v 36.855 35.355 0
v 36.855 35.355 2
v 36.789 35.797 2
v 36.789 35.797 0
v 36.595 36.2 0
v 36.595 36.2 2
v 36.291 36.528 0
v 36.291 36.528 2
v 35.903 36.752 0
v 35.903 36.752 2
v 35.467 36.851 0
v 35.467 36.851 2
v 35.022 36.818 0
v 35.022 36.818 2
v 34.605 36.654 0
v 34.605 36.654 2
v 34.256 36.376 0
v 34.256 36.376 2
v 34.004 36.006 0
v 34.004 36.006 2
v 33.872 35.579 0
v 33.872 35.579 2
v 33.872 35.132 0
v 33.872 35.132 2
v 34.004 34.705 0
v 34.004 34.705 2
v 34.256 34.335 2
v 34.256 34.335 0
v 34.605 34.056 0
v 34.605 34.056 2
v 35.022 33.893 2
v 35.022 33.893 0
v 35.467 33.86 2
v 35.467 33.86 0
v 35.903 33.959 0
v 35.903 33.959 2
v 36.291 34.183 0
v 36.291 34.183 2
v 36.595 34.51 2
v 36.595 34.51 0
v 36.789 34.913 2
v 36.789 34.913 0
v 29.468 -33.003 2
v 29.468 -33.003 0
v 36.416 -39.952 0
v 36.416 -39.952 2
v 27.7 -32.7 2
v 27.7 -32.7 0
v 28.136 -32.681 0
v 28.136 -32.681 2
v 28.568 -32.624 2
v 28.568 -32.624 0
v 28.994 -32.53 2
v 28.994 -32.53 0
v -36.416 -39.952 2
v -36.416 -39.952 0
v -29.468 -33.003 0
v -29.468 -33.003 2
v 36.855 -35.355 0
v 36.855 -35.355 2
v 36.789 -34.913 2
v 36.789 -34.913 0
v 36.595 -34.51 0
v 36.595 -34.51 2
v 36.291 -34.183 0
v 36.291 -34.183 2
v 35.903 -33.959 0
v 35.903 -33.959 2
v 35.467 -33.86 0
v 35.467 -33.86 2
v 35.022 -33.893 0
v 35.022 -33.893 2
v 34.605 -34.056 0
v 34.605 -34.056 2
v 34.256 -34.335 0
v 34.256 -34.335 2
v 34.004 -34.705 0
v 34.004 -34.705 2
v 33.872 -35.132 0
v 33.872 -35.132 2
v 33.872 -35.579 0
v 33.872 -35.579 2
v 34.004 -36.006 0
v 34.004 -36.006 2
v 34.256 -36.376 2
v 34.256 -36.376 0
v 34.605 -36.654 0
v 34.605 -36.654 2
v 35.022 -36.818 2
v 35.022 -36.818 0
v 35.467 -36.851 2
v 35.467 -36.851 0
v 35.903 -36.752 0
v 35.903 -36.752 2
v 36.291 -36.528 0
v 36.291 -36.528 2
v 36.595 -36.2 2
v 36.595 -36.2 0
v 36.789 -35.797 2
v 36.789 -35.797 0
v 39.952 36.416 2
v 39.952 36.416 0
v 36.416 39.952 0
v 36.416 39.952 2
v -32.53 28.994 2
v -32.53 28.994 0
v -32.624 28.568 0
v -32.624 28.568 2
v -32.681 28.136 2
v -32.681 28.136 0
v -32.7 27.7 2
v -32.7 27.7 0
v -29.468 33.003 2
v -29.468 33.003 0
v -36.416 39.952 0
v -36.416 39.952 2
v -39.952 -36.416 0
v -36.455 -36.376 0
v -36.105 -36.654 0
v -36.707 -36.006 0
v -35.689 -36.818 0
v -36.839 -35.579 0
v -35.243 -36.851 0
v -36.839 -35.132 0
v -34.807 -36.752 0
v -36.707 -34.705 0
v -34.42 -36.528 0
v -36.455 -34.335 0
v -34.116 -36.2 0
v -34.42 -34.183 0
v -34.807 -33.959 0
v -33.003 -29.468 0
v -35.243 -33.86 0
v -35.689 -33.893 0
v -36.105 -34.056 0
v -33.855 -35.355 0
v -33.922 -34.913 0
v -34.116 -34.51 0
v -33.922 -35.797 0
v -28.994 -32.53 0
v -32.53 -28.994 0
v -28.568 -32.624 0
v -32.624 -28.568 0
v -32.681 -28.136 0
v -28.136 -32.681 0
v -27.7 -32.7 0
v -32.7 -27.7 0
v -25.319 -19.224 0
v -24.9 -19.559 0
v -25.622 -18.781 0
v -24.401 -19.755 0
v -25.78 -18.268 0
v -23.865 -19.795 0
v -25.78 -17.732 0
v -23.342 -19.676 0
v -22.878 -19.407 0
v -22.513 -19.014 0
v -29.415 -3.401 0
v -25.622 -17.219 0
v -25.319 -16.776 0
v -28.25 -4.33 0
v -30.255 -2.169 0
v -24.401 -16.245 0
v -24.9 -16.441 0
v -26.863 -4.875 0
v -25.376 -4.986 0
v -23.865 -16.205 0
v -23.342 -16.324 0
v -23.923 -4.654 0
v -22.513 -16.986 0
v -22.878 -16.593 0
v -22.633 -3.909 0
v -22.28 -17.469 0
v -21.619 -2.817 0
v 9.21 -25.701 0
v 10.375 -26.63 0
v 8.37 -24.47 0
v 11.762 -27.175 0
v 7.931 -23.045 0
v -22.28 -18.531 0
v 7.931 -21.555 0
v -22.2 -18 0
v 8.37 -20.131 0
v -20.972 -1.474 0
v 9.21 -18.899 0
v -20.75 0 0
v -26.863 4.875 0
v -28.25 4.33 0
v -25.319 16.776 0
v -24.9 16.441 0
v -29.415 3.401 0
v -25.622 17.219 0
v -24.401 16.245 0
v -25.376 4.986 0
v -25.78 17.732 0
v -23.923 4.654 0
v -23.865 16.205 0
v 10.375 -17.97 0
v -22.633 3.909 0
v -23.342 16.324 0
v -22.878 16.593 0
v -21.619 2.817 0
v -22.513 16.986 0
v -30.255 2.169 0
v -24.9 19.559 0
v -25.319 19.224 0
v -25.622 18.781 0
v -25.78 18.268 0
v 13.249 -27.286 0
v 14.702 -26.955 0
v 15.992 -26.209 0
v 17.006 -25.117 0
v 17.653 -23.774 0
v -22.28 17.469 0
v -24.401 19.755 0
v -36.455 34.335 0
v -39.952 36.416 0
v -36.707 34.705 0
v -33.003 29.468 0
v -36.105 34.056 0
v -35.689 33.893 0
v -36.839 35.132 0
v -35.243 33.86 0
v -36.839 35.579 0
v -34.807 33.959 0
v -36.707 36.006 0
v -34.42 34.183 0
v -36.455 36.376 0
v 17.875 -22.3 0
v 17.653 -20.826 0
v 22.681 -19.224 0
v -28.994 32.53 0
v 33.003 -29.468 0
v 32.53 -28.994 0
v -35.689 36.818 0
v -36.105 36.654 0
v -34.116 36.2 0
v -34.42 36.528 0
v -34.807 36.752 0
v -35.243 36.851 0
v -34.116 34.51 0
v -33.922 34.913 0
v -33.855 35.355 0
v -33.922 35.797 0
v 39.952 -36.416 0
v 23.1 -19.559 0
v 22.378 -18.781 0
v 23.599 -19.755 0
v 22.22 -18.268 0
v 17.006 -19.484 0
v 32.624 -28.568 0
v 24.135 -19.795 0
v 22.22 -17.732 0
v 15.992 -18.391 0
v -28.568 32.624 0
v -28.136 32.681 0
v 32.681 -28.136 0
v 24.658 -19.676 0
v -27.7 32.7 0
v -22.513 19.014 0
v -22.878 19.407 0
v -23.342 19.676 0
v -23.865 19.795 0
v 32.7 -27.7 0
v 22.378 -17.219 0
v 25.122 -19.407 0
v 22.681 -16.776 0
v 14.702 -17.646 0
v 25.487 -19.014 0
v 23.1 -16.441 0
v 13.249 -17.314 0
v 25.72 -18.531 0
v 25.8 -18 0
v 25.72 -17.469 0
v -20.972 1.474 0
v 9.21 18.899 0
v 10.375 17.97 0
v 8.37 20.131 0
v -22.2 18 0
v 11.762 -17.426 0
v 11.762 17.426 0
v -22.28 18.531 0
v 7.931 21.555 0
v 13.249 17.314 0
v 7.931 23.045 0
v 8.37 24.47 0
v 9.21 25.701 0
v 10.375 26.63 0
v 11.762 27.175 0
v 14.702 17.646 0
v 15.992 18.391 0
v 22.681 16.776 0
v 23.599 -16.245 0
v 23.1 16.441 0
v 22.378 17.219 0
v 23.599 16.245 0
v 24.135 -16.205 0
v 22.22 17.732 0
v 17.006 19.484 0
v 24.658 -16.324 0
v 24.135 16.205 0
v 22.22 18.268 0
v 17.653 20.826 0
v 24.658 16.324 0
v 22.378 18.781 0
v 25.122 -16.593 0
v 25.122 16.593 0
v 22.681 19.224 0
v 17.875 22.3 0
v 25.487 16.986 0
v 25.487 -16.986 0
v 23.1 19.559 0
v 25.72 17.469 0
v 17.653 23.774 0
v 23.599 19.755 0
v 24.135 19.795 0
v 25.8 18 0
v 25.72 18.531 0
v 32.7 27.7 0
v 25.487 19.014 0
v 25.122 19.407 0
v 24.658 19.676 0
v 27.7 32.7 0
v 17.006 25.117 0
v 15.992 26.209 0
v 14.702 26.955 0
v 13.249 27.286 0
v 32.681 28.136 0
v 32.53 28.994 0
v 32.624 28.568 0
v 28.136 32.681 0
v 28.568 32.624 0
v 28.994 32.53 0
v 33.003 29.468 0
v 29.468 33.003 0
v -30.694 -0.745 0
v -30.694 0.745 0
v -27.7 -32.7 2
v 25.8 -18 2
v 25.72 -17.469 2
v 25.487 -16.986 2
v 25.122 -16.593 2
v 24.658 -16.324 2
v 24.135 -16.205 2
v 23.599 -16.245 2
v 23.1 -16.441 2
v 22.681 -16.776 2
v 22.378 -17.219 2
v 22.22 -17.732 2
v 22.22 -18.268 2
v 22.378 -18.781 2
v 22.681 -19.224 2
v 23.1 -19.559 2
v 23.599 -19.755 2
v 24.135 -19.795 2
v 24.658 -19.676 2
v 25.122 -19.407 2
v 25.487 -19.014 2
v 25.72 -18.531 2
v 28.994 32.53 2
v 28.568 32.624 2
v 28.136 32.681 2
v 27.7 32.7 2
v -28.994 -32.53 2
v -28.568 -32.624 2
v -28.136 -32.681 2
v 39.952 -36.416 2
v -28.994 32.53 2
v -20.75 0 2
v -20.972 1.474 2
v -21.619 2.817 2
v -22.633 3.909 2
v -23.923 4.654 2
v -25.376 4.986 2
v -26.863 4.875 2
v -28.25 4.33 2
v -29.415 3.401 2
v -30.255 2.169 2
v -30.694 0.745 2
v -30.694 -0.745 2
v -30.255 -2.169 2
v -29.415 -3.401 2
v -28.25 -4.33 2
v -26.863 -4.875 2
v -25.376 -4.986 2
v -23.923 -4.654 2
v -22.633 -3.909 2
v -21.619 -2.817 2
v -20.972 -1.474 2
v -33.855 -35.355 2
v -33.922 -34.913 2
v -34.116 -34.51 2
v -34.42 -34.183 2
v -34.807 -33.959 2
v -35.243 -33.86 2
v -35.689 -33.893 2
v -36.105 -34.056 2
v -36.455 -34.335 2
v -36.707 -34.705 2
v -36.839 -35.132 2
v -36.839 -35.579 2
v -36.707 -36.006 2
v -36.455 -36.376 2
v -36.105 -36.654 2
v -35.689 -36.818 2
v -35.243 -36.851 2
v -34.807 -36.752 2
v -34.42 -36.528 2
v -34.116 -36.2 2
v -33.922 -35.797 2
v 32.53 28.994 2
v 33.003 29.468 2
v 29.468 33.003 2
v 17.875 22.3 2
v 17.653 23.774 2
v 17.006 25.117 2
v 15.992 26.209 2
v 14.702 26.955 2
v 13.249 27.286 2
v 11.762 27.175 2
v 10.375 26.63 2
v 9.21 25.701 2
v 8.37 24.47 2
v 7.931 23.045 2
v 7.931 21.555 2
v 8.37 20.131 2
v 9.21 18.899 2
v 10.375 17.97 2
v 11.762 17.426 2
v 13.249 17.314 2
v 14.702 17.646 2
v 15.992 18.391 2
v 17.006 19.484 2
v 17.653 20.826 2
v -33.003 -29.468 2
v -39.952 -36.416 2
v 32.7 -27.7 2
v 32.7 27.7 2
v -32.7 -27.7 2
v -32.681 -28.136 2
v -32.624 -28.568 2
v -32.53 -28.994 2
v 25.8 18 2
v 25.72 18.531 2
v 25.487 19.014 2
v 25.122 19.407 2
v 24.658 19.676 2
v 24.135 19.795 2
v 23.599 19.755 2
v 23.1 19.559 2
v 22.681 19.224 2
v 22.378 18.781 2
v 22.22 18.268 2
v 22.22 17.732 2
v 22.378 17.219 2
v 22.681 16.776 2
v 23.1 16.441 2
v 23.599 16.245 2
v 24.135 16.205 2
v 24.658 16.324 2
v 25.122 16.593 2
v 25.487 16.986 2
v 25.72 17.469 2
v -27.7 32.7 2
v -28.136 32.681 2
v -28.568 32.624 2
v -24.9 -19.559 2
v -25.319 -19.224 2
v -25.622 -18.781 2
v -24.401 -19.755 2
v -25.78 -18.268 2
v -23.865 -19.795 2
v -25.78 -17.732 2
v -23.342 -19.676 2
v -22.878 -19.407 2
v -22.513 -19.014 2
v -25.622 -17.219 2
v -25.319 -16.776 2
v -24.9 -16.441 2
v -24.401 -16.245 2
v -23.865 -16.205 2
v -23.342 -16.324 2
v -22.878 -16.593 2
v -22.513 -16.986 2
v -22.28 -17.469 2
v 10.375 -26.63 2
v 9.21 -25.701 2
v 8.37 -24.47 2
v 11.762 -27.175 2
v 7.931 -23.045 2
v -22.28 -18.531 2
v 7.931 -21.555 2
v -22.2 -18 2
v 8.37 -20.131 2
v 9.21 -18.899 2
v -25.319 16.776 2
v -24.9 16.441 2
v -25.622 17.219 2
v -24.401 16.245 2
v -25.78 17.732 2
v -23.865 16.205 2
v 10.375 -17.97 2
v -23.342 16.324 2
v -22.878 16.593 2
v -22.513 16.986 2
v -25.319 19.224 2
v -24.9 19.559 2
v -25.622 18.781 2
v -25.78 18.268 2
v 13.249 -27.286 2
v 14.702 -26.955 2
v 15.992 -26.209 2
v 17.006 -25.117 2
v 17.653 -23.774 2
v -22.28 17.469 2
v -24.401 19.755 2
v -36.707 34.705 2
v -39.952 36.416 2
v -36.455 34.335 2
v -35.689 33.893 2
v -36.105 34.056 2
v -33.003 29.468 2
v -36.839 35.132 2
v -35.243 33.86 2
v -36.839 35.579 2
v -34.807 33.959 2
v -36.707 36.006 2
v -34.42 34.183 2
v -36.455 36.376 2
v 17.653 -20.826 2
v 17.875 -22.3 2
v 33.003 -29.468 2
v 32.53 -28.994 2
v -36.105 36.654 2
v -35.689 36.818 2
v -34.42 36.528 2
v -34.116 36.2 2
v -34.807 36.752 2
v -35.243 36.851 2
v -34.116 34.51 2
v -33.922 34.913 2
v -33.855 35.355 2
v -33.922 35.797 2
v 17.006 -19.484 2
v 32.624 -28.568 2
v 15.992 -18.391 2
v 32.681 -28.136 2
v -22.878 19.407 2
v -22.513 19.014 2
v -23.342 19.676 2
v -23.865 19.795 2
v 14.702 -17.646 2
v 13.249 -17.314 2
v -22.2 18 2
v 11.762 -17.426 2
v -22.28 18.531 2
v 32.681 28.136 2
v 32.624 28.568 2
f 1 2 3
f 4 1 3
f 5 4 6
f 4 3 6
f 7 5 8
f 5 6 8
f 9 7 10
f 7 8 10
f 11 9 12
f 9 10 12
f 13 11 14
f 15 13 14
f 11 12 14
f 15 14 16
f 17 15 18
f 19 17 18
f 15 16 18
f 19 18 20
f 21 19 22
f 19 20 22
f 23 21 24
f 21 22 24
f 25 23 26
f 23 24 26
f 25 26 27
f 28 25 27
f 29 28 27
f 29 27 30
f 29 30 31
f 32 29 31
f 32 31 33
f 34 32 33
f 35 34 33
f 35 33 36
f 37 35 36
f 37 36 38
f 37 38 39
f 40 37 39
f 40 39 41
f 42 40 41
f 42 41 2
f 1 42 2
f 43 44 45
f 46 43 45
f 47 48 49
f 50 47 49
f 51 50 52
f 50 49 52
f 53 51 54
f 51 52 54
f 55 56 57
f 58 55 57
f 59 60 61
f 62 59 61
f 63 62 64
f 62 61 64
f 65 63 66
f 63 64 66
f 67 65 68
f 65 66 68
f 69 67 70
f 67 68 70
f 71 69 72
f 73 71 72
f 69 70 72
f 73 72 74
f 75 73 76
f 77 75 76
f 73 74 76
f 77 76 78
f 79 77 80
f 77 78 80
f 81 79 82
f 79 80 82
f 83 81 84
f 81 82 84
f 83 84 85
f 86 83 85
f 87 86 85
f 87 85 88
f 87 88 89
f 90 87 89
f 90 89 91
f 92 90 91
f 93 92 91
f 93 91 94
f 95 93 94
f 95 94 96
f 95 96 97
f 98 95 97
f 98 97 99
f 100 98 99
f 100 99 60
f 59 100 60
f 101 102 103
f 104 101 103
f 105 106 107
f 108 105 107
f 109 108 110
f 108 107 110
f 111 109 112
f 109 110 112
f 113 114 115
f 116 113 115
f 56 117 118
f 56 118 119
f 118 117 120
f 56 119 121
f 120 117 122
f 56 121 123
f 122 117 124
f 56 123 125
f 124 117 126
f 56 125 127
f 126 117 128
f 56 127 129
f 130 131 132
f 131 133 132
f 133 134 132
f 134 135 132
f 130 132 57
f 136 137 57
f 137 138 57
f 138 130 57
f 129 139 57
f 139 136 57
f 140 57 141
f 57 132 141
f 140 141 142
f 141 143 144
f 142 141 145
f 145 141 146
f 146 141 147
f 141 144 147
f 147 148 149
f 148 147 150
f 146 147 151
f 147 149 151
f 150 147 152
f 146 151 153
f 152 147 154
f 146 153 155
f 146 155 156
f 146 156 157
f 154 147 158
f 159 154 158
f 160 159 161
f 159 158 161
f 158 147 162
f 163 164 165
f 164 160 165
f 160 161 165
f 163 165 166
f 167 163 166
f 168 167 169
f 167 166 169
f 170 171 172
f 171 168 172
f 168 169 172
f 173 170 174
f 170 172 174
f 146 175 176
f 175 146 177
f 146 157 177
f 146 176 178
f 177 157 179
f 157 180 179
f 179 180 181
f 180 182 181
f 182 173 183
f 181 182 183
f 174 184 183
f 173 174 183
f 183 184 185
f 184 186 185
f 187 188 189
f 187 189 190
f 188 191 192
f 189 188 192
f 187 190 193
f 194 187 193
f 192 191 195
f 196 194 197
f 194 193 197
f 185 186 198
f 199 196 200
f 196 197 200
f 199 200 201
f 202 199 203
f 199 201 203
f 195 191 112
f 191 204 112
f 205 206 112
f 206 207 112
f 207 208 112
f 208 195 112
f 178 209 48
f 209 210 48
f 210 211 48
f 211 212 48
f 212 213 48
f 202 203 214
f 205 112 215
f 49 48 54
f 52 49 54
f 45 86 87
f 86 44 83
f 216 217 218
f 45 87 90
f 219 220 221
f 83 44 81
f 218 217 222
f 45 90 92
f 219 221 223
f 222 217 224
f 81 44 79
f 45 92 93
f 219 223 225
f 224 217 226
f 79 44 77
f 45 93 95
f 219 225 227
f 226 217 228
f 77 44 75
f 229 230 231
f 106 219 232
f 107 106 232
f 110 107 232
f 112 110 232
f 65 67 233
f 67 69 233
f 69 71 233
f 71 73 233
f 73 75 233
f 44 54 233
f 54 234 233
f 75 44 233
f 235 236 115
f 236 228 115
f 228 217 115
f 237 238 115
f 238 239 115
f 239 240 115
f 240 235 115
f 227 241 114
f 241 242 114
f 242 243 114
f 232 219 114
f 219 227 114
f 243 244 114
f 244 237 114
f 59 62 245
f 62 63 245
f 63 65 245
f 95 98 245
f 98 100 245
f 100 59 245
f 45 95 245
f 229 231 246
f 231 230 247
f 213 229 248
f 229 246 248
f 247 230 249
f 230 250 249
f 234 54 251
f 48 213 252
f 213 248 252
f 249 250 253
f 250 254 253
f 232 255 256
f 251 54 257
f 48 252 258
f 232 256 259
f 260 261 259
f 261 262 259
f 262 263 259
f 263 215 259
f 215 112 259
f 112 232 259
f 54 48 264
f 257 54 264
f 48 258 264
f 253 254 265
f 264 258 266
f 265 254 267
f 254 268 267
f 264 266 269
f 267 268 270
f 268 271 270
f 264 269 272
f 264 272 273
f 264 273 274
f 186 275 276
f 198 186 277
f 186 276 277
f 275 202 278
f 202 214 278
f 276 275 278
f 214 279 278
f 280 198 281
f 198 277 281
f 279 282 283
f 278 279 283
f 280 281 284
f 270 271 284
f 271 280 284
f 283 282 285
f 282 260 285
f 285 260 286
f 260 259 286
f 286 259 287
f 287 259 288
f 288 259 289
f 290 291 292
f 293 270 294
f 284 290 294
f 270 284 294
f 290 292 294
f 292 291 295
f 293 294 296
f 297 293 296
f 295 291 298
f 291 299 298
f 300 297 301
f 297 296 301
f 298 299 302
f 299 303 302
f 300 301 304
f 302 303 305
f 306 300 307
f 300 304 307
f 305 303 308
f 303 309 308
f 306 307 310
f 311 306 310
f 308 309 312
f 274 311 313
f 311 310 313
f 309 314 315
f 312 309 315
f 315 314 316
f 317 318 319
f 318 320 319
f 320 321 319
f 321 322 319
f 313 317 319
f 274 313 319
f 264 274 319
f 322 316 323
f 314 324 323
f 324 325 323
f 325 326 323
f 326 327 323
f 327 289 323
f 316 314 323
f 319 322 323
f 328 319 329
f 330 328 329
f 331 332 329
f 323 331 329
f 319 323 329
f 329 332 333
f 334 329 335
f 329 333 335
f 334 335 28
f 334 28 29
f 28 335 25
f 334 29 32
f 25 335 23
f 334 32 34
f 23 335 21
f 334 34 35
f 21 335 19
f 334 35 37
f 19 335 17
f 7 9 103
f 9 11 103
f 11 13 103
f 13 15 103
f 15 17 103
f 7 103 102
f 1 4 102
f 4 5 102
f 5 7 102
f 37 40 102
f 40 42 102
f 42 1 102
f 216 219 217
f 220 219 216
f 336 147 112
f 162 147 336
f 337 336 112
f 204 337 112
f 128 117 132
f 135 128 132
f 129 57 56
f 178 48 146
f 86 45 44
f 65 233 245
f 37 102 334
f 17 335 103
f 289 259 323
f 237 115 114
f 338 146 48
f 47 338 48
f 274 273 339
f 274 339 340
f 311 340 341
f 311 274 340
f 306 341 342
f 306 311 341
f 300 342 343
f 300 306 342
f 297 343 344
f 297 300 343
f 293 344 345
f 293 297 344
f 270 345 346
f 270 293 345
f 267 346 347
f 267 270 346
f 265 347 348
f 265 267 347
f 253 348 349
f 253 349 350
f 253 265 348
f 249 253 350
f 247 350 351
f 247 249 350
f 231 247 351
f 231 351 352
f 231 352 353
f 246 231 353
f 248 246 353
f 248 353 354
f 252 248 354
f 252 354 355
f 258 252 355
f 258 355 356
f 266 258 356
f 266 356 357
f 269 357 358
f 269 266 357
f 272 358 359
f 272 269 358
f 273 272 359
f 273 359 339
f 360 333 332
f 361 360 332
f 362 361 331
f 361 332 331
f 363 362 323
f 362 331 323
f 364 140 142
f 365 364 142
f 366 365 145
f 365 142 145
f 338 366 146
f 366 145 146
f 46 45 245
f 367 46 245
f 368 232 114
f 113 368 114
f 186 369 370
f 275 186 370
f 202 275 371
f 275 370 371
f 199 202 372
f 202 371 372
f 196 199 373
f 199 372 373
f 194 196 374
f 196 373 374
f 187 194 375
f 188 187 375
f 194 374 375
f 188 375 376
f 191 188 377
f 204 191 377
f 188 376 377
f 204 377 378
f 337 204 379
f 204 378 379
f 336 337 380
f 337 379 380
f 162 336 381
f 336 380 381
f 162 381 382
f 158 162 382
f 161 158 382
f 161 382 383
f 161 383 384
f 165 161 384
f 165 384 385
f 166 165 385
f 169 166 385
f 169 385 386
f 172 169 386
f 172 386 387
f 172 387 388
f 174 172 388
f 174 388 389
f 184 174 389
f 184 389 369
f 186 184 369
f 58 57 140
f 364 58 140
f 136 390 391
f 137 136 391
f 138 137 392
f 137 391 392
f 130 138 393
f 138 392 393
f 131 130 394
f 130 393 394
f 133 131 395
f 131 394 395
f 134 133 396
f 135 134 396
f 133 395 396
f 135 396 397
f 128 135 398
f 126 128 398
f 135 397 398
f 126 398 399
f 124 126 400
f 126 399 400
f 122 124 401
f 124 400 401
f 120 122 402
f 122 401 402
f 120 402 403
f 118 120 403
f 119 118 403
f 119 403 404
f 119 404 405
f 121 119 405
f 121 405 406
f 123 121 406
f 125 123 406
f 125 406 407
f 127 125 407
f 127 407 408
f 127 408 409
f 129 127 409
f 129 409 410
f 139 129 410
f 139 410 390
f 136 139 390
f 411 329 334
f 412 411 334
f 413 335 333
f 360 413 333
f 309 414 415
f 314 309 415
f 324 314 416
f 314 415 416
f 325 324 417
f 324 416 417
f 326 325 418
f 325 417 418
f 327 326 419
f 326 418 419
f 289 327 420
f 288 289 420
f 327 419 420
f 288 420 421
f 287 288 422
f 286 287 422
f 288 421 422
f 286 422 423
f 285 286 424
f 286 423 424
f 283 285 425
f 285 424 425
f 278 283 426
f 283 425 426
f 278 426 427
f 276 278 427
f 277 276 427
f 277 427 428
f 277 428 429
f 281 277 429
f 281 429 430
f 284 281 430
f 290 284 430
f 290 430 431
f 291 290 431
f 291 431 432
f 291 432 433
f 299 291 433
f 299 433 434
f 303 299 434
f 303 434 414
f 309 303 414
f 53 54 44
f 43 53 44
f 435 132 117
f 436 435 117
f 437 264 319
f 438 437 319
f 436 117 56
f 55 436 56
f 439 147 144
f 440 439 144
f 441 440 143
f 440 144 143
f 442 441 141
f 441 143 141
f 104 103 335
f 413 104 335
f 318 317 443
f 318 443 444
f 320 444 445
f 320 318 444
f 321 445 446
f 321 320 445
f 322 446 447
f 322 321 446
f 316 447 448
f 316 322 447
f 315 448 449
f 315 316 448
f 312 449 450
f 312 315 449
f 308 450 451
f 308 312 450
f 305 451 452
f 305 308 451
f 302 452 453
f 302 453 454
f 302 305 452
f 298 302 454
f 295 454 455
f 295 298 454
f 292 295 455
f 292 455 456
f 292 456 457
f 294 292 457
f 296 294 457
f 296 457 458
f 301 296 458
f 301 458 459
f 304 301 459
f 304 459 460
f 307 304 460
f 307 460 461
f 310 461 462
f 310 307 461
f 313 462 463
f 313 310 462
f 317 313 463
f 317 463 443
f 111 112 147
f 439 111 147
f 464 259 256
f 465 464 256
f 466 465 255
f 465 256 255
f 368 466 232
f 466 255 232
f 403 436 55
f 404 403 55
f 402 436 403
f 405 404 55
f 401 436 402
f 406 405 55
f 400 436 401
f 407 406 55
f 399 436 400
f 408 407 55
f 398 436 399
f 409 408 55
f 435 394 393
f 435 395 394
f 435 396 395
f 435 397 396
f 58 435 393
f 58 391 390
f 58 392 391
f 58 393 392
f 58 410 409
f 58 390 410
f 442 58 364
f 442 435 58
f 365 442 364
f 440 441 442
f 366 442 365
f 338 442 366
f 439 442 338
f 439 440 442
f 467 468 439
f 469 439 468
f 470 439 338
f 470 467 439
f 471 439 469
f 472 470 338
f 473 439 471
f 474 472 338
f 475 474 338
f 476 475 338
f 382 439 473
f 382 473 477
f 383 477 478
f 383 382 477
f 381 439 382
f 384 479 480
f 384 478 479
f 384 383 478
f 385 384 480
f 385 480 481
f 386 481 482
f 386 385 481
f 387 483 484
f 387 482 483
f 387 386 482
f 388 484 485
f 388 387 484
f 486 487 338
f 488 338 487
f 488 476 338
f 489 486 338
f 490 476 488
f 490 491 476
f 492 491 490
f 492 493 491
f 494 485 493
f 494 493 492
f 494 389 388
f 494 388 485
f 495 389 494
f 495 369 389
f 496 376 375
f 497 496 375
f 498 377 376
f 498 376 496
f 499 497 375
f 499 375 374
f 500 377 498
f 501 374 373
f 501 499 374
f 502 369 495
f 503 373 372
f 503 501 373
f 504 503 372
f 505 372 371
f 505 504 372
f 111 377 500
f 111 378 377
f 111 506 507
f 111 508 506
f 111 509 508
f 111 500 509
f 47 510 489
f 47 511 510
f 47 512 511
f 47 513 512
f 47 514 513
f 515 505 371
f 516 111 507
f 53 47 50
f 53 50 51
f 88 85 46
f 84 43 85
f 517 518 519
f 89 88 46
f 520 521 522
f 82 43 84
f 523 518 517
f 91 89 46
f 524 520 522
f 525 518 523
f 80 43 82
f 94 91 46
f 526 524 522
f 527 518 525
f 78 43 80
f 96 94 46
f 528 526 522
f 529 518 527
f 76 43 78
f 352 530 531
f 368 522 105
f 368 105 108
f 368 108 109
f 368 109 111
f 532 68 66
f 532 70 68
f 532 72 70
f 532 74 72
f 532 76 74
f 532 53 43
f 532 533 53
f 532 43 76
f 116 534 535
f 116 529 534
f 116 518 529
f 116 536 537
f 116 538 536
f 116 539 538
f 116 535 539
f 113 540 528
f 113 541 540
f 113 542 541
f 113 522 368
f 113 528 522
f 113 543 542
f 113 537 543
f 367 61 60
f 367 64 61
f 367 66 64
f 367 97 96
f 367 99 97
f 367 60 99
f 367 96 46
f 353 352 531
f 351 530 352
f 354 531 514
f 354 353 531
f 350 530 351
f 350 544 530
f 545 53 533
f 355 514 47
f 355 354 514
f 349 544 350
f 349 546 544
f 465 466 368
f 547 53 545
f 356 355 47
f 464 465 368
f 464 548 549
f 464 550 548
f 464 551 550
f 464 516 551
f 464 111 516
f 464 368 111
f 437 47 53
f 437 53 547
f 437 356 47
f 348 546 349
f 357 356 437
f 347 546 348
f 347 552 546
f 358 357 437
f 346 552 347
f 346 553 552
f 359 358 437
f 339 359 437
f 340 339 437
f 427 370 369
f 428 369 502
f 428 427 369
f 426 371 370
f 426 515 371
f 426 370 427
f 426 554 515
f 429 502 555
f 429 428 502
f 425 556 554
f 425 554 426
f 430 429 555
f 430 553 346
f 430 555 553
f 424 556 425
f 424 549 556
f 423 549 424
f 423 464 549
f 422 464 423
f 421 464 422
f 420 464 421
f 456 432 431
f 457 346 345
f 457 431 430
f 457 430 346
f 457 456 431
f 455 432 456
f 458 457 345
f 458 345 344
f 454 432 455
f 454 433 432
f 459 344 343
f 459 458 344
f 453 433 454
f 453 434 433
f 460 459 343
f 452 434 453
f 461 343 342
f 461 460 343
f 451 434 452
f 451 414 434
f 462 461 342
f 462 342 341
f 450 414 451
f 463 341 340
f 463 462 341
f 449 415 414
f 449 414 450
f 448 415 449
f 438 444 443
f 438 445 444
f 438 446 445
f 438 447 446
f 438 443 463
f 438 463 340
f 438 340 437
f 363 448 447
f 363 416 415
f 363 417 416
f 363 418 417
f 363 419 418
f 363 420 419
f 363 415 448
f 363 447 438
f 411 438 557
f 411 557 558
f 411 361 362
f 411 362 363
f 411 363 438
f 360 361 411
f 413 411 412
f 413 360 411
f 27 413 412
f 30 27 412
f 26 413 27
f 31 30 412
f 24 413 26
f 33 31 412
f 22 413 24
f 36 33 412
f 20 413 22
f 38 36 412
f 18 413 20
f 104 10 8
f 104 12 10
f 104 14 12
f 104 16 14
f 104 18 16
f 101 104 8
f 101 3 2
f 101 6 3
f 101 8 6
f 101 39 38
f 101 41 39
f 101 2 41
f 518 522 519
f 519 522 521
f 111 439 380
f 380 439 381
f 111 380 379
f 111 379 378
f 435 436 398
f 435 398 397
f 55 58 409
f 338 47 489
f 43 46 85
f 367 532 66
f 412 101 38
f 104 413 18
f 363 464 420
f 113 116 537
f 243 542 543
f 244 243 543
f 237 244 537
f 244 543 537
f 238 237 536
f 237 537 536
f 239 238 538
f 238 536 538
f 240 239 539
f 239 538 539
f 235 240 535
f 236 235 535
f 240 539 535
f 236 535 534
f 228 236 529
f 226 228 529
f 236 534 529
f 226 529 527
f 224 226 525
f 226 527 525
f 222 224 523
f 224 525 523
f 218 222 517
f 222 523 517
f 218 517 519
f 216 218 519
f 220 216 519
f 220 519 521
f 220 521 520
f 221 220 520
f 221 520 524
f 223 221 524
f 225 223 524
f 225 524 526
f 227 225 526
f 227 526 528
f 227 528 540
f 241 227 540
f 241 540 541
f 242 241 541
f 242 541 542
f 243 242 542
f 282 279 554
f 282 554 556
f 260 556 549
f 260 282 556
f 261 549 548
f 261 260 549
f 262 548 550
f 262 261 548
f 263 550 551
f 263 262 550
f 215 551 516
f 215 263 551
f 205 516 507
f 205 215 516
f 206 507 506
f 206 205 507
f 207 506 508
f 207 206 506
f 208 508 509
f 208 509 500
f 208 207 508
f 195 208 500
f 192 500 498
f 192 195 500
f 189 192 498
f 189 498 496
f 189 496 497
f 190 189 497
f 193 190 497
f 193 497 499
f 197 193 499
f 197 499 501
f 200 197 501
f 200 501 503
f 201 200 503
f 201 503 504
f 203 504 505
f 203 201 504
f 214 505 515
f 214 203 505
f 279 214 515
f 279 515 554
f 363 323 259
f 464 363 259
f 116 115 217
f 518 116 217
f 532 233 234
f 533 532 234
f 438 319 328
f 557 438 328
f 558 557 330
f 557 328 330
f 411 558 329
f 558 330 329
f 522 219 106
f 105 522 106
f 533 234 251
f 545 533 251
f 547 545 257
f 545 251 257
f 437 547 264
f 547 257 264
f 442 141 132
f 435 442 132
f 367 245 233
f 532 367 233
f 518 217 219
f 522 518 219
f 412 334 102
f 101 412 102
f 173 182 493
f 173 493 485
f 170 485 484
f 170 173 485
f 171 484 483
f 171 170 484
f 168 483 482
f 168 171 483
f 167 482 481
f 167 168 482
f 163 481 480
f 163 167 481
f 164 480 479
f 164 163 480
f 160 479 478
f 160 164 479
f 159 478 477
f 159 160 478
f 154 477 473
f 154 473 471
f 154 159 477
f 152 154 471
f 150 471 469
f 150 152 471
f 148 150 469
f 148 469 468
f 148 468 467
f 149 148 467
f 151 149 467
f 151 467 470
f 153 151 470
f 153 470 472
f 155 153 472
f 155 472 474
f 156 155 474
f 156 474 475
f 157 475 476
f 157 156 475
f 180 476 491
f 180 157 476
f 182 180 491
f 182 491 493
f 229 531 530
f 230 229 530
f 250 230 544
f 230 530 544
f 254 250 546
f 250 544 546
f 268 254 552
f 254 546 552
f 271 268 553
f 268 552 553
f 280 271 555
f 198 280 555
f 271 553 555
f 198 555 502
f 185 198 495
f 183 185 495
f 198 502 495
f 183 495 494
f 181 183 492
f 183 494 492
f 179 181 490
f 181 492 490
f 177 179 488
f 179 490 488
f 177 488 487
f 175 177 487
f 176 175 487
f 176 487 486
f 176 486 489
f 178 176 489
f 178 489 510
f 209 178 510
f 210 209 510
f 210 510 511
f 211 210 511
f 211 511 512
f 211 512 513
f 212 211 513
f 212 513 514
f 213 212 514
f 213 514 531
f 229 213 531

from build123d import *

# Parameters (mm, degrees)
SKETCH_1_R          = 1.8
EXTRUDE_1_DEPTH     = 2
EXTRUDE_START       = -2
EXTRUDE_2_DEPTH     = 2
CUT_EXTRUDE_1_REACH = 58.535
SKETCH_4_R          = 1.5
CUT_EXTRUDE_2_REACH = 58.535
SKETCH_5_R          = 5


with BuildPart() as part:
    # 草图1 → 凸台-拉伸1 (new body)
    with BuildSketch(Plane.XY):
        with BuildLine():
            Line((-27.7, -32.7), (27.7, -32.7))
            ThreePointArc((27.7, -32.7), (31.235533906, -31.235533906), (32.7, -27.7))
            Line((32.7, -27.7), (32.7, 27.7))
            ThreePointArc((32.7, 27.7), (31.235533906, 31.235533906), (27.7, 32.7))
            Line((27.7, 32.7), (-27.7, 32.7))
            ThreePointArc((-27.7, 32.7), (-31.235533906, 31.235533906), (-32.7, 27.7))
            Line((-32.7, 27.7), (-32.7, -27.7))
            ThreePointArc((-32.7, -27.7), (-31.235533906, -31.235533906), (-27.7, -32.7))
        make_face()
        with Locations((24, 18)):
            Circle(SKETCH_1_R, mode=Mode.SUBTRACT)
        with Locations((-24, 18)):
            Circle(SKETCH_1_R, mode=Mode.SUBTRACT)
        with Locations((-24, -18)):
            Circle(SKETCH_1_R, mode=Mode.SUBTRACT)
        with Locations((24, -18)):
            Circle(SKETCH_1_R, mode=Mode.SUBTRACT)
    extrude(amount=EXTRUDE_1_DEPTH)

    # 草图3 → 凸台-拉伸2 (add)
    with BuildSketch(Plane.XY.offset(2).offset(EXTRUDE_START)):
        with BuildLine():
            Line((-39.951533137, 36.415999231), (-33.003300859, 29.467766953))
            Line((-33.003300859, 29.467766953), (-32.529629131, 28.994095226))
            ThreePointArc((-32.529629131, 28.994095226), (-31.235533906, 31.235533906), (-28.994095226, 32.529629131))
            Line((-28.994095226, 32.529629131), (-29.467766953, 33.003300859))
            Line((-29.467766953, 33.003300859), (-36.415999231, 39.951533137))
            Line((-36.415999231, 39.951533137), (-39.951533137, 36.415999231))
        make_face()
        with BuildLine():
            ThreePointArc((-28.994095226, 32.529629131), (-31.235533906, 31.235533906), (-32.529629131, 28.994095226))
            Line((-32.529629131, 28.994095226), (-31.037342597, 27.501808691))
            Line((-31.037342597, 27.501808691), (-27.501808691, 31.037342597))
            Line((-27.501808691, 31.037342597), (-28.994095226, 32.529629131))
        make_face()
        with BuildLine():
            ThreePointArc((32.529629131, 28.994095226), (31.235533906, 31.235533906), (28.994095226, 32.529629131))
            Line((28.994095226, 32.529629131), (27.501808691, 31.037342597))
            Line((27.501808691, 31.037342597), (31.037342597, 27.501808691))
            Line((31.037342597, 27.501808691), (32.529629131, 28.994095226))
        make_face()
        with BuildLine():
            Line((29.467766953, 33.003300859), (28.994095226, 32.529629131))
            ThreePointArc((28.994095226, 32.529629131), (31.235533906, 31.235533906), (32.529629131, 28.994095226))
            Line((32.529629131, 28.994095226), (33.003300859, 29.467766953))
            Line((33.003300859, 29.467766953), (39.951533137, 36.415999231))
            Line((39.951533137, 36.415999231), (36.415999231, 39.951533137))
            Line((36.415999231, 39.951533137), (29.467766953, 33.003300859))
        make_face()
        with BuildLine():
            Line((27.501808691, -31.037342597), (28.994095226, -32.529629131))
            ThreePointArc((28.994095226, -32.529629131), (31.235533906, -31.235533906), (32.529629131, -28.994095226))
            Line((32.529629131, -28.994095226), (31.037342597, -27.501808691))
            Line((31.037342597, -27.501808691), (27.501808691, -31.037342597))
        make_face()
        with BuildLine():
            ThreePointArc((32.529629131, -28.994095226), (31.235533906, -31.235533906), (28.994095226, -32.529629131))
            Line((28.994095226, -32.529629131), (29.467766953, -33.003300859))
            Line((29.467766953, -33.003300859), (36.415999231, -39.951533137))
            Line((36.415999231, -39.951533137), (39.951533137, -36.415999231))
            Line((39.951533137, -36.415999231), (33.003300859, -29.467766953))
            Line((33.003300859, -29.467766953), (32.529629131, -28.994095226))
        make_face()
        with BuildLine():
            ThreePointArc((-28.994095226, -32.529629131), (-31.235533906, -31.235533906), (-32.529629131, -28.994095226))
            Line((-32.529629131, -28.994095226), (-33.003300859, -29.467766953))
            Line((-33.003300859, -29.467766953), (-39.951533137, -36.415999231))
            Line((-39.951533137, -36.415999231), (-36.415999231, -39.951533137))
            Line((-36.415999231, -39.951533137), (-29.467766953, -33.003300859))
            Line((-29.467766953, -33.003300859), (-28.994095226, -32.529629131))
        make_face()
        with BuildLine():
            Line((-31.037342597, -27.501808691), (-32.529629131, -28.994095226))
            ThreePointArc((-32.529629131, -28.994095226), (-31.235533906, -31.235533906), (-28.994095226, -32.529629131))
            Line((-28.994095226, -32.529629131), (-27.501808691, -31.037342597))
            Line((-27.501808691, -31.037342597), (-31.037342597, -27.501808691))
        make_face()
    extrude(amount=EXTRUDE_2_DEPTH)

    # 草图4 → 切除-拉伸1 (cut, up to next)
    with BuildSketch(Plane.XY.offset(2), mode=Mode.PRIVATE) as cut_extrude_1_sk1:
        with Locations((-35.355339059, 35.355339059)):
            Circle(SKETCH_4_R)
    cut_extrude_1_tool1 = extrude(cut_extrude_1_sk1.sketch, amount=-CUT_EXTRUDE_1_REACH, mode=Mode.PRIVATE) & part.part
    # 草图4 → 切除-拉伸1 (cut, up to next)
    with BuildSketch(Plane.XY.offset(2), mode=Mode.PRIVATE) as cut_extrude_1_sk2:
        with Locations((35.355339059, 35.355339059)):
            Circle(SKETCH_4_R)
    cut_extrude_1_tool2 = extrude(cut_extrude_1_sk2.sketch, amount=-CUT_EXTRUDE_1_REACH, mode=Mode.PRIVATE) & part.part
    # 草图4 → 切除-拉伸1 (cut, up to next)
    with BuildSketch(Plane.XY.offset(2), mode=Mode.PRIVATE) as cut_extrude_1_sk3:
        with Locations((35.355339059, -35.355339059)):
            Circle(SKETCH_4_R)
    cut_extrude_1_tool3 = extrude(cut_extrude_1_sk3.sketch, amount=-CUT_EXTRUDE_1_REACH, mode=Mode.PRIVATE) & part.part
    # 草图4 → 切除-拉伸1 (cut, up to next)
    with BuildSketch(Plane.XY.offset(2), mode=Mode.PRIVATE) as cut_extrude_1_sk4:
        with Locations((-35.355339059, -35.355339059)):
            Circle(SKETCH_4_R)
    cut_extrude_1_tool4 = extrude(cut_extrude_1_sk4.sketch, amount=-CUT_EXTRUDE_1_REACH, mode=Mode.PRIVATE) & part.part
    add(cut_extrude_1_tool1.solids().sort_by_distance((-35.355339, 35.355339, 2))[0], mode=Mode.SUBTRACT)
    add(cut_extrude_1_tool2.solids().sort_by_distance((35.355339, 35.355339, 2))[0], mode=Mode.SUBTRACT)
    add(cut_extrude_1_tool3.solids().sort_by_distance((35.355339, -35.355339, 2))[0], mode=Mode.SUBTRACT)
    add(cut_extrude_1_tool4.solids().sort_by_distance((-35.355339, -35.355339, 2))[0], mode=Mode.SUBTRACT)

    # 草图5 → 切除-拉伸2 (cut, up to next)
    with BuildSketch(Plane.XY.offset(2), mode=Mode.PRIVATE) as cut_extrude_2_sk1:
        with Locations((-25.75, 0)):
            Circle(SKETCH_5_R)
    cut_extrude_2_tool1 = extrude(cut_extrude_2_sk1.sketch, amount=-CUT_EXTRUDE_2_REACH, mode=Mode.PRIVATE) & part.part
    # 草图5 → 切除-拉伸2 (cut, up to next)
    with BuildSketch(Plane.XY.offset(2), mode=Mode.PRIVATE) as cut_extrude_2_sk2:
        with Locations((12.875, 22.300154147)):
            Circle(SKETCH_5_R)
    cut_extrude_2_tool2 = extrude(cut_extrude_2_sk2.sketch, amount=-CUT_EXTRUDE_2_REACH, mode=Mode.PRIVATE) & part.part
    # 草图5 → 切除-拉伸2 (cut, up to next)
    with BuildSketch(Plane.XY.offset(2), mode=Mode.PRIVATE) as cut_extrude_2_sk3:
        with Locations((12.875, -22.300154147)):
            Circle(SKETCH_5_R)
    cut_extrude_2_tool3 = extrude(cut_extrude_2_sk3.sketch, amount=-CUT_EXTRUDE_2_REACH, mode=Mode.PRIVATE) & part.part
    add(cut_extrude_2_tool1.solids().sort_by_distance((-25.75, 0, 2))[0], mode=Mode.SUBTRACT)
    add(cut_extrude_2_tool2.solids().sort_by_distance((12.875, 22.300154, 2))[0], mode=Mode.SUBTRACT)
    add(cut_extrude_2_tool3.solids().sort_by_distance((12.875, -22.300154, 2))[0], mode=Mode.SUBTRACT)


solid = part.part
